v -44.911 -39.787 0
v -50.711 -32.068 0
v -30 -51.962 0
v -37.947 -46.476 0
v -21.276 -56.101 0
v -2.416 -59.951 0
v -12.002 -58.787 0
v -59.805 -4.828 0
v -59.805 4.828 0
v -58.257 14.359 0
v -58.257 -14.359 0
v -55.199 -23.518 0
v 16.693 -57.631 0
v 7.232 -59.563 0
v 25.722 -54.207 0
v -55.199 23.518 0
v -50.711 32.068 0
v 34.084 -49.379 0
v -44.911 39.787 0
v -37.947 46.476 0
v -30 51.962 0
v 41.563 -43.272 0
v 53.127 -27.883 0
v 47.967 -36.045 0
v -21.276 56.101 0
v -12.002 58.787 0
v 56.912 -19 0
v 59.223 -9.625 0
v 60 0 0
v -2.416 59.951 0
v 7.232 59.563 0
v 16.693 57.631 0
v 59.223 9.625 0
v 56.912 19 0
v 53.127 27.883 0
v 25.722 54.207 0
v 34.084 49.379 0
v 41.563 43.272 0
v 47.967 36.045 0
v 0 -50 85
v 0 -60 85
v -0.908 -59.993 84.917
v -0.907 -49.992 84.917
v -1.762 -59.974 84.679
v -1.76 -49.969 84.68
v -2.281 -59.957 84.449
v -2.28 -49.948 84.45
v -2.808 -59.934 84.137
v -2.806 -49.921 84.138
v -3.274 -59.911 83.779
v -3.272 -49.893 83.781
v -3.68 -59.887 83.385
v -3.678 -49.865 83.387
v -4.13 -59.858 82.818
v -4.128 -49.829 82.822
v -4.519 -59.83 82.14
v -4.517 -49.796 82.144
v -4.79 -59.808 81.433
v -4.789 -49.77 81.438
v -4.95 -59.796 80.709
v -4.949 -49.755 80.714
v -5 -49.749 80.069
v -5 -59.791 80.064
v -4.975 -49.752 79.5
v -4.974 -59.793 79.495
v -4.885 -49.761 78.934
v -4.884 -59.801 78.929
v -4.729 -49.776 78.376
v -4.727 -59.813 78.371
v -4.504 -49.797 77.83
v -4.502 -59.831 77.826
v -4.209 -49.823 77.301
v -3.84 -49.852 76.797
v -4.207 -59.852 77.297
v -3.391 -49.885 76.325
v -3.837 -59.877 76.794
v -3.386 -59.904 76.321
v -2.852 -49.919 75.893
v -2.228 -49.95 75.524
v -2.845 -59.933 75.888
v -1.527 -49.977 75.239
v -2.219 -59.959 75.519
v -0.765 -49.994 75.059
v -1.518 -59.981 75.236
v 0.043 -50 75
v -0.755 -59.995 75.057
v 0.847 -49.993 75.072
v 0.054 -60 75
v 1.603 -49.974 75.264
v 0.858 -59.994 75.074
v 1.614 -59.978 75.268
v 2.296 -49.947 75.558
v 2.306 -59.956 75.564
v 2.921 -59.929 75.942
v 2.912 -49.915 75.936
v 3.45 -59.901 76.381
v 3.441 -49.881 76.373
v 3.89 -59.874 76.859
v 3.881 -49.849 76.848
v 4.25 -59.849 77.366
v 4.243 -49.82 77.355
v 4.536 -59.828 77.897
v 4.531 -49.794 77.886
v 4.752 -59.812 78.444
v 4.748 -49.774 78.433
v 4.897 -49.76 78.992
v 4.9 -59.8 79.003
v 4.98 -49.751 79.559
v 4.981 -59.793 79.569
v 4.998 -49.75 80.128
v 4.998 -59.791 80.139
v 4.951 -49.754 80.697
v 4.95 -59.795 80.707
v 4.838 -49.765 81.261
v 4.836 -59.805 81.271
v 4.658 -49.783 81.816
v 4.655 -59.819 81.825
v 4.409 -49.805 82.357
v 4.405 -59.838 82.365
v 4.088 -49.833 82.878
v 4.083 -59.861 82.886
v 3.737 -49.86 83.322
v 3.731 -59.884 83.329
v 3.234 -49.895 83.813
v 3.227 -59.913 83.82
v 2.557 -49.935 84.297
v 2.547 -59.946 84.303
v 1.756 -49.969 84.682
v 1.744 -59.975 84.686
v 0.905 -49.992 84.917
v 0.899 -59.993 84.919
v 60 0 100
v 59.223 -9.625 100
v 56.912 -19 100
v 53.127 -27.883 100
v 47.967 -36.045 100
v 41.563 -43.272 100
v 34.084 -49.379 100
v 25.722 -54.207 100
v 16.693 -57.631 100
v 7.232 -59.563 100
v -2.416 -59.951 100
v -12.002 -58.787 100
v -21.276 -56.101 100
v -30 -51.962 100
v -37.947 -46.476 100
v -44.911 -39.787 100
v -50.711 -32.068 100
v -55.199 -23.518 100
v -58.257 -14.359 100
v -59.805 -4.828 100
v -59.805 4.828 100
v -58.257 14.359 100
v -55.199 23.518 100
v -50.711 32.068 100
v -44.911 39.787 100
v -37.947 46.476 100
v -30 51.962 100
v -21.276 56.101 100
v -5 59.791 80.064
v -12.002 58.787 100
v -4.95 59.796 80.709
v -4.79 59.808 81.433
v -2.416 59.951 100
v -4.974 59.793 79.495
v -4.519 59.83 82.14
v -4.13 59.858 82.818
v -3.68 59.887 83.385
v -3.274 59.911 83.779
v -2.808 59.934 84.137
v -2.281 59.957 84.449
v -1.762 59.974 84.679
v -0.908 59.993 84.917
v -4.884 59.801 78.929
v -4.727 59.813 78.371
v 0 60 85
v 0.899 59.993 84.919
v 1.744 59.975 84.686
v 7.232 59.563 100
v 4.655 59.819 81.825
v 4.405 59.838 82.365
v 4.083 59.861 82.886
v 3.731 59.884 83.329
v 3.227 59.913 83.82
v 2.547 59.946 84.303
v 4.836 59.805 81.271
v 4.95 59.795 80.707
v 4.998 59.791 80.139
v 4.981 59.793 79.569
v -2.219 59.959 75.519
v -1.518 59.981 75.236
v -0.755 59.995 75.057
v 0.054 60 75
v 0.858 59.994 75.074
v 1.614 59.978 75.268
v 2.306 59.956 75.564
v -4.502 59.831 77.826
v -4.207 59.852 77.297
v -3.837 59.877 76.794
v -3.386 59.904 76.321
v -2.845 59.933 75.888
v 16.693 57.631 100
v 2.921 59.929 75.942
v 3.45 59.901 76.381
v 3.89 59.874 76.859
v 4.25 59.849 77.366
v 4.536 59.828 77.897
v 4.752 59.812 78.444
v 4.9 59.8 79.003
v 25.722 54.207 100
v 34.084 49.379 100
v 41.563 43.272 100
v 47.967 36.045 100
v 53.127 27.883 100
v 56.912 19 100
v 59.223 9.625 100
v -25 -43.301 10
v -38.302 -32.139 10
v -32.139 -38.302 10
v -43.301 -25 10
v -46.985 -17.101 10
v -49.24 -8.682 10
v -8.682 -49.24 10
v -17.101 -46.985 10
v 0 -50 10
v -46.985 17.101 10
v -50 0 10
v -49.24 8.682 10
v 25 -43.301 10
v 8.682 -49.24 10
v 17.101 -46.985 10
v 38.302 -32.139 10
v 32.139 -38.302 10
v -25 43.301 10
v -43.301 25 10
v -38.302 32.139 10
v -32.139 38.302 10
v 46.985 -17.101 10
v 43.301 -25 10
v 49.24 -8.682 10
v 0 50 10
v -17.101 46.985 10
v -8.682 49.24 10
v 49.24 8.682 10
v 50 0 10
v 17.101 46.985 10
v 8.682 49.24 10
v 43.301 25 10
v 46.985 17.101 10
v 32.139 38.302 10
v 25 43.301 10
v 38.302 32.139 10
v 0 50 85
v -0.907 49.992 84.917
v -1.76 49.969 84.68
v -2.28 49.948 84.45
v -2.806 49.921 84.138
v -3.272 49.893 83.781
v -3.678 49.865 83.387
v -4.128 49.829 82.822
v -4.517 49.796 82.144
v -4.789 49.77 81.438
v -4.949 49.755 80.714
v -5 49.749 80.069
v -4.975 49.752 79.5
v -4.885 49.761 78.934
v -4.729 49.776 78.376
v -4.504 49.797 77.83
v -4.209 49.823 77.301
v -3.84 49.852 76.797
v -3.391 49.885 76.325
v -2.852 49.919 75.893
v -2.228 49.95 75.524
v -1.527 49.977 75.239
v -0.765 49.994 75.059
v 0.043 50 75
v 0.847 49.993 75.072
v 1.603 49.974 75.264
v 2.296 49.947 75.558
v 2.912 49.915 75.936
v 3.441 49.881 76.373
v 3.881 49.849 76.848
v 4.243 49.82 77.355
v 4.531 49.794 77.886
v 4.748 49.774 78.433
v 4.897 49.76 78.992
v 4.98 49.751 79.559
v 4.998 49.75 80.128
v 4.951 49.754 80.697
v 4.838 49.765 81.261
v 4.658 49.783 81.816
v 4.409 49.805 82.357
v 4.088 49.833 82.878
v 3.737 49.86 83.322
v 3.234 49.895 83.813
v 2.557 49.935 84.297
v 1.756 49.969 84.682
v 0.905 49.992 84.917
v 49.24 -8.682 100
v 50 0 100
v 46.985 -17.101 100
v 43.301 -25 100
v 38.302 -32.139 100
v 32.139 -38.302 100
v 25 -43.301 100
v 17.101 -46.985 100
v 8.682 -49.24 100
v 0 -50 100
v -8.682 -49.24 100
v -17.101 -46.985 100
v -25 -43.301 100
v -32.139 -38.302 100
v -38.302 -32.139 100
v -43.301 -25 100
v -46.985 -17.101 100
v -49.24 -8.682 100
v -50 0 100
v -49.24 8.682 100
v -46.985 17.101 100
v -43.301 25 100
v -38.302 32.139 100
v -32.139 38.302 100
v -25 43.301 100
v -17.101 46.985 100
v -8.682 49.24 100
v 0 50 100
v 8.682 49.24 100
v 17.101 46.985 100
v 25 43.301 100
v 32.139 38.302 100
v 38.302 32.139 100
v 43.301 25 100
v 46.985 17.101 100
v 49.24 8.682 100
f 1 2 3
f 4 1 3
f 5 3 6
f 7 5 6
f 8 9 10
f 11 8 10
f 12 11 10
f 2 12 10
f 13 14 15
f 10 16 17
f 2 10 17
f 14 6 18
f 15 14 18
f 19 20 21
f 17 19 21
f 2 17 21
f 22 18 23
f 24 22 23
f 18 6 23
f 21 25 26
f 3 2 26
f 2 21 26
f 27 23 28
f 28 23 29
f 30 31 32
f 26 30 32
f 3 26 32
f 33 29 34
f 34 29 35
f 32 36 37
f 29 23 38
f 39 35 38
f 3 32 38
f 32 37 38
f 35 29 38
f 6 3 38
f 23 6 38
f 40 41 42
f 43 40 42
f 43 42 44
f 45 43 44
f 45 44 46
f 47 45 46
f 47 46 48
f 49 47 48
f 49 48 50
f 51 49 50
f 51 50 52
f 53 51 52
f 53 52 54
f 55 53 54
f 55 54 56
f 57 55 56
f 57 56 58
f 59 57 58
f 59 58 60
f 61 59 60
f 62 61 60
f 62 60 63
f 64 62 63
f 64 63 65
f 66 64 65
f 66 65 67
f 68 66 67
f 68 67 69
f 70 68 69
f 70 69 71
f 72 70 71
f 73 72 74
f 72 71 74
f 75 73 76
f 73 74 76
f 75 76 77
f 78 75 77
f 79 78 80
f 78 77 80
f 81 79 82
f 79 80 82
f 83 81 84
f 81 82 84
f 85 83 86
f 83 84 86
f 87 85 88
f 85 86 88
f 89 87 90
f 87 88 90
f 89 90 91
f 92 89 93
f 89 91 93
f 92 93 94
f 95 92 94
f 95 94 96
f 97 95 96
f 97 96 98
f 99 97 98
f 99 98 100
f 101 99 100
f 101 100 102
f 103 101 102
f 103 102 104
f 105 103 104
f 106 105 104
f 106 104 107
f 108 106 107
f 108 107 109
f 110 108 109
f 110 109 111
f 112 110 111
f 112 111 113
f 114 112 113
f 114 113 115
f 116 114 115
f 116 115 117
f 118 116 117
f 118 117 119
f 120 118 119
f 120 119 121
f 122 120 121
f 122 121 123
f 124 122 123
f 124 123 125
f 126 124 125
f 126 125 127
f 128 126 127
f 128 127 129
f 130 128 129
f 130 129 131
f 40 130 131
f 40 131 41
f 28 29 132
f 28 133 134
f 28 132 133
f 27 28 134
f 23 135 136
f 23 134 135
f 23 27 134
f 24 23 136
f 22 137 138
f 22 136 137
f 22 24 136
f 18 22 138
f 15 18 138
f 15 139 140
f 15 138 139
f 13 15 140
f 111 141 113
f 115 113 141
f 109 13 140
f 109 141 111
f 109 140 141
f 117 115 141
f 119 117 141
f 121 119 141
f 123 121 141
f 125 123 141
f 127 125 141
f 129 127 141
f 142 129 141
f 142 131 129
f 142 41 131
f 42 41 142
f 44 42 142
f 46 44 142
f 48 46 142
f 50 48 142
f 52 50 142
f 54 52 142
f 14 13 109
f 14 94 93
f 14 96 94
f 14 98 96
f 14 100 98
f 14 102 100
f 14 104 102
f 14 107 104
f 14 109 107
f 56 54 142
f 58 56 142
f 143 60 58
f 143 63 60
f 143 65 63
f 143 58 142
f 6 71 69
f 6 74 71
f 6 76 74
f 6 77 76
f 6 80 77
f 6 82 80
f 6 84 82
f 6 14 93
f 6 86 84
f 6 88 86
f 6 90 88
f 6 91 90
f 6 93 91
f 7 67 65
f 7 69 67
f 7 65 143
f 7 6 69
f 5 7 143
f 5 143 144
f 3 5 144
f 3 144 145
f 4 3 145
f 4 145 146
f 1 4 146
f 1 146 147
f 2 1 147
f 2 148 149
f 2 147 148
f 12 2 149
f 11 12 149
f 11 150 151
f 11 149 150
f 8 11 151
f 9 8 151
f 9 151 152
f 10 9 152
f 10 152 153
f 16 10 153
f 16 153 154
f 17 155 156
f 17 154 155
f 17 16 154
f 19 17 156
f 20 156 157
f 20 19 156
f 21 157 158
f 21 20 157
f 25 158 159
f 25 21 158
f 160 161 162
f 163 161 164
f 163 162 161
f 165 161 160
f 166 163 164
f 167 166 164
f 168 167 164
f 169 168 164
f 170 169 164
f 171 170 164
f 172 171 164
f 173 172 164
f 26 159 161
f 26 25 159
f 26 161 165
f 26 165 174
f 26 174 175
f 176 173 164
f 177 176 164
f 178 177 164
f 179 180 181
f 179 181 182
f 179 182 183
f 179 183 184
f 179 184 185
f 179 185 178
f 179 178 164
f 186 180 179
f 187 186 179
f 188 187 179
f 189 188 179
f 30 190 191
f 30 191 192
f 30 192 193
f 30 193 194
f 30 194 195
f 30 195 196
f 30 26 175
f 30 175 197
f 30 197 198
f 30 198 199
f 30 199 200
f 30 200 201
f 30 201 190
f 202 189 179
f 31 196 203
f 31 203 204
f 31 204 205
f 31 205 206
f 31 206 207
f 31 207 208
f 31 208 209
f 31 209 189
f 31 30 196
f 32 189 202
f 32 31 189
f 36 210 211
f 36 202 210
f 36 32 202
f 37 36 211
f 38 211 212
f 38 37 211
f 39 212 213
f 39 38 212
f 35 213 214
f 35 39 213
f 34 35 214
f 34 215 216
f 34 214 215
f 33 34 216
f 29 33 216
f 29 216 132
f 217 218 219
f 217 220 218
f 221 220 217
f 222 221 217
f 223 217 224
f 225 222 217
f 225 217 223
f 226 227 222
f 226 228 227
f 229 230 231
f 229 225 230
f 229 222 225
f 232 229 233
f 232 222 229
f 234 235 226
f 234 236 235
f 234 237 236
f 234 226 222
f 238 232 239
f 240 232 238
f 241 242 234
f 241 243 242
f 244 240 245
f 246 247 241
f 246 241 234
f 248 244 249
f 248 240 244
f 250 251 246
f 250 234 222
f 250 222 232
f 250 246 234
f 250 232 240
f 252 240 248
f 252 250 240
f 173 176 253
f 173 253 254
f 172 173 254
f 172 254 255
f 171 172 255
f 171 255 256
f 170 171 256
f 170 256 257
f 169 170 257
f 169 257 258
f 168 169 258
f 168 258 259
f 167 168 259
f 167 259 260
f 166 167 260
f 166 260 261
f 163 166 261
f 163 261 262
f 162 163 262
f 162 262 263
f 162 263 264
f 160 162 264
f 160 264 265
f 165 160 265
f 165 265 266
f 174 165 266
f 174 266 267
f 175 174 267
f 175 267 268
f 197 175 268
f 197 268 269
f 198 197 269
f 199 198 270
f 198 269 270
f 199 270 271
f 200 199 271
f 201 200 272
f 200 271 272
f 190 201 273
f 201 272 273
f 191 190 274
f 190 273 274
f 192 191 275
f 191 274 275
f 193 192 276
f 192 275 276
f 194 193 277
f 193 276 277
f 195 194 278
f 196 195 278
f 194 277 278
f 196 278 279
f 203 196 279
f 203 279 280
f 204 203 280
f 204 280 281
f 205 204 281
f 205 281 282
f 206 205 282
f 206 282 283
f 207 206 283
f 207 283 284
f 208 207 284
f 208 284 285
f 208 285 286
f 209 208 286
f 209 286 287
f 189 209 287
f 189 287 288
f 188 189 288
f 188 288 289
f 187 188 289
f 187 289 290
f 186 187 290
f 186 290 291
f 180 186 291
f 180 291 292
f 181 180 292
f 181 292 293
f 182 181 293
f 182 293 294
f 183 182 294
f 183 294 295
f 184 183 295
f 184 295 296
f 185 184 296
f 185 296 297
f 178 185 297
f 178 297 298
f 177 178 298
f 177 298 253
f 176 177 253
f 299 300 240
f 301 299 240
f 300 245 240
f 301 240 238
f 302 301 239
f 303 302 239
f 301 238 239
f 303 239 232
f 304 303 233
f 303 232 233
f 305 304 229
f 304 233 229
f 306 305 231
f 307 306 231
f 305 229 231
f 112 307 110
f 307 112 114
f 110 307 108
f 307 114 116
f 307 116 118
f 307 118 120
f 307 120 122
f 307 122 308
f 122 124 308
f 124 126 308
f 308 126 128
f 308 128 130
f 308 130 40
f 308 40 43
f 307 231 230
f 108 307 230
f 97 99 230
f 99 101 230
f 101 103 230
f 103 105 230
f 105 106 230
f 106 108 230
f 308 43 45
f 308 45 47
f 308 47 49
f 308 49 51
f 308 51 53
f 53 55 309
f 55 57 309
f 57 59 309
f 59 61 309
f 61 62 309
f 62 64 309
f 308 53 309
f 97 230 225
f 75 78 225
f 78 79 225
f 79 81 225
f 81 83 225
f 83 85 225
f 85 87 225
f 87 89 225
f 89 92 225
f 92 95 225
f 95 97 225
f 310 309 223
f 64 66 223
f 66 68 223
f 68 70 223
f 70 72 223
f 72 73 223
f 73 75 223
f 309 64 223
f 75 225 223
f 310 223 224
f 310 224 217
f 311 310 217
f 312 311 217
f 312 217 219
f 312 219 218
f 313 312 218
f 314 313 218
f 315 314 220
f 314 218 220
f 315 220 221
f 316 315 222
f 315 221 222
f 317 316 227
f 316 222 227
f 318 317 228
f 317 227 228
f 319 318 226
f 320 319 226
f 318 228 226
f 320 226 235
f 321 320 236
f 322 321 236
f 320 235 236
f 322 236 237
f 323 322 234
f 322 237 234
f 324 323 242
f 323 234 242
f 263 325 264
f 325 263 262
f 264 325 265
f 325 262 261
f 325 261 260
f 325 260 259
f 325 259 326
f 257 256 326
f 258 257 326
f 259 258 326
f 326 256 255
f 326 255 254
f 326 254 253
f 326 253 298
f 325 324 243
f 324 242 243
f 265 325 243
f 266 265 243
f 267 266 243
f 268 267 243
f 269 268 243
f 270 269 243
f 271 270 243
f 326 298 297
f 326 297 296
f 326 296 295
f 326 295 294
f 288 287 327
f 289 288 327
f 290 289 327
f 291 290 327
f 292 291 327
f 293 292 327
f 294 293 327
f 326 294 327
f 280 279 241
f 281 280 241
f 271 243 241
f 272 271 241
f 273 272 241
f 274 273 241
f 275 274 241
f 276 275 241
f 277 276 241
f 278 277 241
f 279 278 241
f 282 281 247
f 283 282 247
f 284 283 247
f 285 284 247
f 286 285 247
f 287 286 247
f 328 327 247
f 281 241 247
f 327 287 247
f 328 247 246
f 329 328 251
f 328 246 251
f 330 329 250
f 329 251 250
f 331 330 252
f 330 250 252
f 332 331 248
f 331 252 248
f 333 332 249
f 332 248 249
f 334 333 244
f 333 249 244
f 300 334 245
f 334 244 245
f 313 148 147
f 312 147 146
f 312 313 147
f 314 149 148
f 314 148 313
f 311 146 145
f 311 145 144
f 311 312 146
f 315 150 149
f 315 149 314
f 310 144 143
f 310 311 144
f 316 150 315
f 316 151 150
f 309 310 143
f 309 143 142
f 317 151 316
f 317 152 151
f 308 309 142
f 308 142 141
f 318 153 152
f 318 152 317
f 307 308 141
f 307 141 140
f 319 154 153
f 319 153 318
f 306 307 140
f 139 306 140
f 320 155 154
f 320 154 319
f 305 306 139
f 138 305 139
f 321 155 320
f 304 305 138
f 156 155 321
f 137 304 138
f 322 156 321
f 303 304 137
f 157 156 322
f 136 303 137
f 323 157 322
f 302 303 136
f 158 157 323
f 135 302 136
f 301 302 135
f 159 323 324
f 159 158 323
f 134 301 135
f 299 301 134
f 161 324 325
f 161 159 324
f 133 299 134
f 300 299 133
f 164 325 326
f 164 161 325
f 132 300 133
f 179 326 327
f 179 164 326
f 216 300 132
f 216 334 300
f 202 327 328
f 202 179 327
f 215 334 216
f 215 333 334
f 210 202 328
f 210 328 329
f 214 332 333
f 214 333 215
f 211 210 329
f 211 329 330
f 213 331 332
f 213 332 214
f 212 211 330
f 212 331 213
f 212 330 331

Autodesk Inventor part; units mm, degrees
ref_plane "YZ Plane" through (0, 0, 0) normal (1, 0, 0) x (0, 1, 0)
ref_plane "XZ Plane" through (0, 0, 0) normal (0, 1, 0) x (-1, 0, 0)
ref_plane "XY Plane" through (0, 0, 0) normal (0, 0, 1) x (1, 0, 0)
sketch "草图1" plane through (0, 0, 0) normal (0, 0, 1) x (1, 0, 0)
  circle A0 centre (0, 0) radius 60
  dimension "d0" = 120
extrude "拉伸1" add sketch "草图1" along normal blind 100
shell "抽壳1" thickness 10 removed faces 1 at (20.3445, -12.2, 100)
sketch "草图2" plane through (0, 0, 0) normal (0, 1, 0) x (-1, 0, 0)
  point P0 (0, 0)
  point P1 (0, 80)
  dimension "d4" = 80
hole "孔1" at (0, 0, 80) direction (0, -1, 0) diameter 10 end through all both
properties part number "活塞"
